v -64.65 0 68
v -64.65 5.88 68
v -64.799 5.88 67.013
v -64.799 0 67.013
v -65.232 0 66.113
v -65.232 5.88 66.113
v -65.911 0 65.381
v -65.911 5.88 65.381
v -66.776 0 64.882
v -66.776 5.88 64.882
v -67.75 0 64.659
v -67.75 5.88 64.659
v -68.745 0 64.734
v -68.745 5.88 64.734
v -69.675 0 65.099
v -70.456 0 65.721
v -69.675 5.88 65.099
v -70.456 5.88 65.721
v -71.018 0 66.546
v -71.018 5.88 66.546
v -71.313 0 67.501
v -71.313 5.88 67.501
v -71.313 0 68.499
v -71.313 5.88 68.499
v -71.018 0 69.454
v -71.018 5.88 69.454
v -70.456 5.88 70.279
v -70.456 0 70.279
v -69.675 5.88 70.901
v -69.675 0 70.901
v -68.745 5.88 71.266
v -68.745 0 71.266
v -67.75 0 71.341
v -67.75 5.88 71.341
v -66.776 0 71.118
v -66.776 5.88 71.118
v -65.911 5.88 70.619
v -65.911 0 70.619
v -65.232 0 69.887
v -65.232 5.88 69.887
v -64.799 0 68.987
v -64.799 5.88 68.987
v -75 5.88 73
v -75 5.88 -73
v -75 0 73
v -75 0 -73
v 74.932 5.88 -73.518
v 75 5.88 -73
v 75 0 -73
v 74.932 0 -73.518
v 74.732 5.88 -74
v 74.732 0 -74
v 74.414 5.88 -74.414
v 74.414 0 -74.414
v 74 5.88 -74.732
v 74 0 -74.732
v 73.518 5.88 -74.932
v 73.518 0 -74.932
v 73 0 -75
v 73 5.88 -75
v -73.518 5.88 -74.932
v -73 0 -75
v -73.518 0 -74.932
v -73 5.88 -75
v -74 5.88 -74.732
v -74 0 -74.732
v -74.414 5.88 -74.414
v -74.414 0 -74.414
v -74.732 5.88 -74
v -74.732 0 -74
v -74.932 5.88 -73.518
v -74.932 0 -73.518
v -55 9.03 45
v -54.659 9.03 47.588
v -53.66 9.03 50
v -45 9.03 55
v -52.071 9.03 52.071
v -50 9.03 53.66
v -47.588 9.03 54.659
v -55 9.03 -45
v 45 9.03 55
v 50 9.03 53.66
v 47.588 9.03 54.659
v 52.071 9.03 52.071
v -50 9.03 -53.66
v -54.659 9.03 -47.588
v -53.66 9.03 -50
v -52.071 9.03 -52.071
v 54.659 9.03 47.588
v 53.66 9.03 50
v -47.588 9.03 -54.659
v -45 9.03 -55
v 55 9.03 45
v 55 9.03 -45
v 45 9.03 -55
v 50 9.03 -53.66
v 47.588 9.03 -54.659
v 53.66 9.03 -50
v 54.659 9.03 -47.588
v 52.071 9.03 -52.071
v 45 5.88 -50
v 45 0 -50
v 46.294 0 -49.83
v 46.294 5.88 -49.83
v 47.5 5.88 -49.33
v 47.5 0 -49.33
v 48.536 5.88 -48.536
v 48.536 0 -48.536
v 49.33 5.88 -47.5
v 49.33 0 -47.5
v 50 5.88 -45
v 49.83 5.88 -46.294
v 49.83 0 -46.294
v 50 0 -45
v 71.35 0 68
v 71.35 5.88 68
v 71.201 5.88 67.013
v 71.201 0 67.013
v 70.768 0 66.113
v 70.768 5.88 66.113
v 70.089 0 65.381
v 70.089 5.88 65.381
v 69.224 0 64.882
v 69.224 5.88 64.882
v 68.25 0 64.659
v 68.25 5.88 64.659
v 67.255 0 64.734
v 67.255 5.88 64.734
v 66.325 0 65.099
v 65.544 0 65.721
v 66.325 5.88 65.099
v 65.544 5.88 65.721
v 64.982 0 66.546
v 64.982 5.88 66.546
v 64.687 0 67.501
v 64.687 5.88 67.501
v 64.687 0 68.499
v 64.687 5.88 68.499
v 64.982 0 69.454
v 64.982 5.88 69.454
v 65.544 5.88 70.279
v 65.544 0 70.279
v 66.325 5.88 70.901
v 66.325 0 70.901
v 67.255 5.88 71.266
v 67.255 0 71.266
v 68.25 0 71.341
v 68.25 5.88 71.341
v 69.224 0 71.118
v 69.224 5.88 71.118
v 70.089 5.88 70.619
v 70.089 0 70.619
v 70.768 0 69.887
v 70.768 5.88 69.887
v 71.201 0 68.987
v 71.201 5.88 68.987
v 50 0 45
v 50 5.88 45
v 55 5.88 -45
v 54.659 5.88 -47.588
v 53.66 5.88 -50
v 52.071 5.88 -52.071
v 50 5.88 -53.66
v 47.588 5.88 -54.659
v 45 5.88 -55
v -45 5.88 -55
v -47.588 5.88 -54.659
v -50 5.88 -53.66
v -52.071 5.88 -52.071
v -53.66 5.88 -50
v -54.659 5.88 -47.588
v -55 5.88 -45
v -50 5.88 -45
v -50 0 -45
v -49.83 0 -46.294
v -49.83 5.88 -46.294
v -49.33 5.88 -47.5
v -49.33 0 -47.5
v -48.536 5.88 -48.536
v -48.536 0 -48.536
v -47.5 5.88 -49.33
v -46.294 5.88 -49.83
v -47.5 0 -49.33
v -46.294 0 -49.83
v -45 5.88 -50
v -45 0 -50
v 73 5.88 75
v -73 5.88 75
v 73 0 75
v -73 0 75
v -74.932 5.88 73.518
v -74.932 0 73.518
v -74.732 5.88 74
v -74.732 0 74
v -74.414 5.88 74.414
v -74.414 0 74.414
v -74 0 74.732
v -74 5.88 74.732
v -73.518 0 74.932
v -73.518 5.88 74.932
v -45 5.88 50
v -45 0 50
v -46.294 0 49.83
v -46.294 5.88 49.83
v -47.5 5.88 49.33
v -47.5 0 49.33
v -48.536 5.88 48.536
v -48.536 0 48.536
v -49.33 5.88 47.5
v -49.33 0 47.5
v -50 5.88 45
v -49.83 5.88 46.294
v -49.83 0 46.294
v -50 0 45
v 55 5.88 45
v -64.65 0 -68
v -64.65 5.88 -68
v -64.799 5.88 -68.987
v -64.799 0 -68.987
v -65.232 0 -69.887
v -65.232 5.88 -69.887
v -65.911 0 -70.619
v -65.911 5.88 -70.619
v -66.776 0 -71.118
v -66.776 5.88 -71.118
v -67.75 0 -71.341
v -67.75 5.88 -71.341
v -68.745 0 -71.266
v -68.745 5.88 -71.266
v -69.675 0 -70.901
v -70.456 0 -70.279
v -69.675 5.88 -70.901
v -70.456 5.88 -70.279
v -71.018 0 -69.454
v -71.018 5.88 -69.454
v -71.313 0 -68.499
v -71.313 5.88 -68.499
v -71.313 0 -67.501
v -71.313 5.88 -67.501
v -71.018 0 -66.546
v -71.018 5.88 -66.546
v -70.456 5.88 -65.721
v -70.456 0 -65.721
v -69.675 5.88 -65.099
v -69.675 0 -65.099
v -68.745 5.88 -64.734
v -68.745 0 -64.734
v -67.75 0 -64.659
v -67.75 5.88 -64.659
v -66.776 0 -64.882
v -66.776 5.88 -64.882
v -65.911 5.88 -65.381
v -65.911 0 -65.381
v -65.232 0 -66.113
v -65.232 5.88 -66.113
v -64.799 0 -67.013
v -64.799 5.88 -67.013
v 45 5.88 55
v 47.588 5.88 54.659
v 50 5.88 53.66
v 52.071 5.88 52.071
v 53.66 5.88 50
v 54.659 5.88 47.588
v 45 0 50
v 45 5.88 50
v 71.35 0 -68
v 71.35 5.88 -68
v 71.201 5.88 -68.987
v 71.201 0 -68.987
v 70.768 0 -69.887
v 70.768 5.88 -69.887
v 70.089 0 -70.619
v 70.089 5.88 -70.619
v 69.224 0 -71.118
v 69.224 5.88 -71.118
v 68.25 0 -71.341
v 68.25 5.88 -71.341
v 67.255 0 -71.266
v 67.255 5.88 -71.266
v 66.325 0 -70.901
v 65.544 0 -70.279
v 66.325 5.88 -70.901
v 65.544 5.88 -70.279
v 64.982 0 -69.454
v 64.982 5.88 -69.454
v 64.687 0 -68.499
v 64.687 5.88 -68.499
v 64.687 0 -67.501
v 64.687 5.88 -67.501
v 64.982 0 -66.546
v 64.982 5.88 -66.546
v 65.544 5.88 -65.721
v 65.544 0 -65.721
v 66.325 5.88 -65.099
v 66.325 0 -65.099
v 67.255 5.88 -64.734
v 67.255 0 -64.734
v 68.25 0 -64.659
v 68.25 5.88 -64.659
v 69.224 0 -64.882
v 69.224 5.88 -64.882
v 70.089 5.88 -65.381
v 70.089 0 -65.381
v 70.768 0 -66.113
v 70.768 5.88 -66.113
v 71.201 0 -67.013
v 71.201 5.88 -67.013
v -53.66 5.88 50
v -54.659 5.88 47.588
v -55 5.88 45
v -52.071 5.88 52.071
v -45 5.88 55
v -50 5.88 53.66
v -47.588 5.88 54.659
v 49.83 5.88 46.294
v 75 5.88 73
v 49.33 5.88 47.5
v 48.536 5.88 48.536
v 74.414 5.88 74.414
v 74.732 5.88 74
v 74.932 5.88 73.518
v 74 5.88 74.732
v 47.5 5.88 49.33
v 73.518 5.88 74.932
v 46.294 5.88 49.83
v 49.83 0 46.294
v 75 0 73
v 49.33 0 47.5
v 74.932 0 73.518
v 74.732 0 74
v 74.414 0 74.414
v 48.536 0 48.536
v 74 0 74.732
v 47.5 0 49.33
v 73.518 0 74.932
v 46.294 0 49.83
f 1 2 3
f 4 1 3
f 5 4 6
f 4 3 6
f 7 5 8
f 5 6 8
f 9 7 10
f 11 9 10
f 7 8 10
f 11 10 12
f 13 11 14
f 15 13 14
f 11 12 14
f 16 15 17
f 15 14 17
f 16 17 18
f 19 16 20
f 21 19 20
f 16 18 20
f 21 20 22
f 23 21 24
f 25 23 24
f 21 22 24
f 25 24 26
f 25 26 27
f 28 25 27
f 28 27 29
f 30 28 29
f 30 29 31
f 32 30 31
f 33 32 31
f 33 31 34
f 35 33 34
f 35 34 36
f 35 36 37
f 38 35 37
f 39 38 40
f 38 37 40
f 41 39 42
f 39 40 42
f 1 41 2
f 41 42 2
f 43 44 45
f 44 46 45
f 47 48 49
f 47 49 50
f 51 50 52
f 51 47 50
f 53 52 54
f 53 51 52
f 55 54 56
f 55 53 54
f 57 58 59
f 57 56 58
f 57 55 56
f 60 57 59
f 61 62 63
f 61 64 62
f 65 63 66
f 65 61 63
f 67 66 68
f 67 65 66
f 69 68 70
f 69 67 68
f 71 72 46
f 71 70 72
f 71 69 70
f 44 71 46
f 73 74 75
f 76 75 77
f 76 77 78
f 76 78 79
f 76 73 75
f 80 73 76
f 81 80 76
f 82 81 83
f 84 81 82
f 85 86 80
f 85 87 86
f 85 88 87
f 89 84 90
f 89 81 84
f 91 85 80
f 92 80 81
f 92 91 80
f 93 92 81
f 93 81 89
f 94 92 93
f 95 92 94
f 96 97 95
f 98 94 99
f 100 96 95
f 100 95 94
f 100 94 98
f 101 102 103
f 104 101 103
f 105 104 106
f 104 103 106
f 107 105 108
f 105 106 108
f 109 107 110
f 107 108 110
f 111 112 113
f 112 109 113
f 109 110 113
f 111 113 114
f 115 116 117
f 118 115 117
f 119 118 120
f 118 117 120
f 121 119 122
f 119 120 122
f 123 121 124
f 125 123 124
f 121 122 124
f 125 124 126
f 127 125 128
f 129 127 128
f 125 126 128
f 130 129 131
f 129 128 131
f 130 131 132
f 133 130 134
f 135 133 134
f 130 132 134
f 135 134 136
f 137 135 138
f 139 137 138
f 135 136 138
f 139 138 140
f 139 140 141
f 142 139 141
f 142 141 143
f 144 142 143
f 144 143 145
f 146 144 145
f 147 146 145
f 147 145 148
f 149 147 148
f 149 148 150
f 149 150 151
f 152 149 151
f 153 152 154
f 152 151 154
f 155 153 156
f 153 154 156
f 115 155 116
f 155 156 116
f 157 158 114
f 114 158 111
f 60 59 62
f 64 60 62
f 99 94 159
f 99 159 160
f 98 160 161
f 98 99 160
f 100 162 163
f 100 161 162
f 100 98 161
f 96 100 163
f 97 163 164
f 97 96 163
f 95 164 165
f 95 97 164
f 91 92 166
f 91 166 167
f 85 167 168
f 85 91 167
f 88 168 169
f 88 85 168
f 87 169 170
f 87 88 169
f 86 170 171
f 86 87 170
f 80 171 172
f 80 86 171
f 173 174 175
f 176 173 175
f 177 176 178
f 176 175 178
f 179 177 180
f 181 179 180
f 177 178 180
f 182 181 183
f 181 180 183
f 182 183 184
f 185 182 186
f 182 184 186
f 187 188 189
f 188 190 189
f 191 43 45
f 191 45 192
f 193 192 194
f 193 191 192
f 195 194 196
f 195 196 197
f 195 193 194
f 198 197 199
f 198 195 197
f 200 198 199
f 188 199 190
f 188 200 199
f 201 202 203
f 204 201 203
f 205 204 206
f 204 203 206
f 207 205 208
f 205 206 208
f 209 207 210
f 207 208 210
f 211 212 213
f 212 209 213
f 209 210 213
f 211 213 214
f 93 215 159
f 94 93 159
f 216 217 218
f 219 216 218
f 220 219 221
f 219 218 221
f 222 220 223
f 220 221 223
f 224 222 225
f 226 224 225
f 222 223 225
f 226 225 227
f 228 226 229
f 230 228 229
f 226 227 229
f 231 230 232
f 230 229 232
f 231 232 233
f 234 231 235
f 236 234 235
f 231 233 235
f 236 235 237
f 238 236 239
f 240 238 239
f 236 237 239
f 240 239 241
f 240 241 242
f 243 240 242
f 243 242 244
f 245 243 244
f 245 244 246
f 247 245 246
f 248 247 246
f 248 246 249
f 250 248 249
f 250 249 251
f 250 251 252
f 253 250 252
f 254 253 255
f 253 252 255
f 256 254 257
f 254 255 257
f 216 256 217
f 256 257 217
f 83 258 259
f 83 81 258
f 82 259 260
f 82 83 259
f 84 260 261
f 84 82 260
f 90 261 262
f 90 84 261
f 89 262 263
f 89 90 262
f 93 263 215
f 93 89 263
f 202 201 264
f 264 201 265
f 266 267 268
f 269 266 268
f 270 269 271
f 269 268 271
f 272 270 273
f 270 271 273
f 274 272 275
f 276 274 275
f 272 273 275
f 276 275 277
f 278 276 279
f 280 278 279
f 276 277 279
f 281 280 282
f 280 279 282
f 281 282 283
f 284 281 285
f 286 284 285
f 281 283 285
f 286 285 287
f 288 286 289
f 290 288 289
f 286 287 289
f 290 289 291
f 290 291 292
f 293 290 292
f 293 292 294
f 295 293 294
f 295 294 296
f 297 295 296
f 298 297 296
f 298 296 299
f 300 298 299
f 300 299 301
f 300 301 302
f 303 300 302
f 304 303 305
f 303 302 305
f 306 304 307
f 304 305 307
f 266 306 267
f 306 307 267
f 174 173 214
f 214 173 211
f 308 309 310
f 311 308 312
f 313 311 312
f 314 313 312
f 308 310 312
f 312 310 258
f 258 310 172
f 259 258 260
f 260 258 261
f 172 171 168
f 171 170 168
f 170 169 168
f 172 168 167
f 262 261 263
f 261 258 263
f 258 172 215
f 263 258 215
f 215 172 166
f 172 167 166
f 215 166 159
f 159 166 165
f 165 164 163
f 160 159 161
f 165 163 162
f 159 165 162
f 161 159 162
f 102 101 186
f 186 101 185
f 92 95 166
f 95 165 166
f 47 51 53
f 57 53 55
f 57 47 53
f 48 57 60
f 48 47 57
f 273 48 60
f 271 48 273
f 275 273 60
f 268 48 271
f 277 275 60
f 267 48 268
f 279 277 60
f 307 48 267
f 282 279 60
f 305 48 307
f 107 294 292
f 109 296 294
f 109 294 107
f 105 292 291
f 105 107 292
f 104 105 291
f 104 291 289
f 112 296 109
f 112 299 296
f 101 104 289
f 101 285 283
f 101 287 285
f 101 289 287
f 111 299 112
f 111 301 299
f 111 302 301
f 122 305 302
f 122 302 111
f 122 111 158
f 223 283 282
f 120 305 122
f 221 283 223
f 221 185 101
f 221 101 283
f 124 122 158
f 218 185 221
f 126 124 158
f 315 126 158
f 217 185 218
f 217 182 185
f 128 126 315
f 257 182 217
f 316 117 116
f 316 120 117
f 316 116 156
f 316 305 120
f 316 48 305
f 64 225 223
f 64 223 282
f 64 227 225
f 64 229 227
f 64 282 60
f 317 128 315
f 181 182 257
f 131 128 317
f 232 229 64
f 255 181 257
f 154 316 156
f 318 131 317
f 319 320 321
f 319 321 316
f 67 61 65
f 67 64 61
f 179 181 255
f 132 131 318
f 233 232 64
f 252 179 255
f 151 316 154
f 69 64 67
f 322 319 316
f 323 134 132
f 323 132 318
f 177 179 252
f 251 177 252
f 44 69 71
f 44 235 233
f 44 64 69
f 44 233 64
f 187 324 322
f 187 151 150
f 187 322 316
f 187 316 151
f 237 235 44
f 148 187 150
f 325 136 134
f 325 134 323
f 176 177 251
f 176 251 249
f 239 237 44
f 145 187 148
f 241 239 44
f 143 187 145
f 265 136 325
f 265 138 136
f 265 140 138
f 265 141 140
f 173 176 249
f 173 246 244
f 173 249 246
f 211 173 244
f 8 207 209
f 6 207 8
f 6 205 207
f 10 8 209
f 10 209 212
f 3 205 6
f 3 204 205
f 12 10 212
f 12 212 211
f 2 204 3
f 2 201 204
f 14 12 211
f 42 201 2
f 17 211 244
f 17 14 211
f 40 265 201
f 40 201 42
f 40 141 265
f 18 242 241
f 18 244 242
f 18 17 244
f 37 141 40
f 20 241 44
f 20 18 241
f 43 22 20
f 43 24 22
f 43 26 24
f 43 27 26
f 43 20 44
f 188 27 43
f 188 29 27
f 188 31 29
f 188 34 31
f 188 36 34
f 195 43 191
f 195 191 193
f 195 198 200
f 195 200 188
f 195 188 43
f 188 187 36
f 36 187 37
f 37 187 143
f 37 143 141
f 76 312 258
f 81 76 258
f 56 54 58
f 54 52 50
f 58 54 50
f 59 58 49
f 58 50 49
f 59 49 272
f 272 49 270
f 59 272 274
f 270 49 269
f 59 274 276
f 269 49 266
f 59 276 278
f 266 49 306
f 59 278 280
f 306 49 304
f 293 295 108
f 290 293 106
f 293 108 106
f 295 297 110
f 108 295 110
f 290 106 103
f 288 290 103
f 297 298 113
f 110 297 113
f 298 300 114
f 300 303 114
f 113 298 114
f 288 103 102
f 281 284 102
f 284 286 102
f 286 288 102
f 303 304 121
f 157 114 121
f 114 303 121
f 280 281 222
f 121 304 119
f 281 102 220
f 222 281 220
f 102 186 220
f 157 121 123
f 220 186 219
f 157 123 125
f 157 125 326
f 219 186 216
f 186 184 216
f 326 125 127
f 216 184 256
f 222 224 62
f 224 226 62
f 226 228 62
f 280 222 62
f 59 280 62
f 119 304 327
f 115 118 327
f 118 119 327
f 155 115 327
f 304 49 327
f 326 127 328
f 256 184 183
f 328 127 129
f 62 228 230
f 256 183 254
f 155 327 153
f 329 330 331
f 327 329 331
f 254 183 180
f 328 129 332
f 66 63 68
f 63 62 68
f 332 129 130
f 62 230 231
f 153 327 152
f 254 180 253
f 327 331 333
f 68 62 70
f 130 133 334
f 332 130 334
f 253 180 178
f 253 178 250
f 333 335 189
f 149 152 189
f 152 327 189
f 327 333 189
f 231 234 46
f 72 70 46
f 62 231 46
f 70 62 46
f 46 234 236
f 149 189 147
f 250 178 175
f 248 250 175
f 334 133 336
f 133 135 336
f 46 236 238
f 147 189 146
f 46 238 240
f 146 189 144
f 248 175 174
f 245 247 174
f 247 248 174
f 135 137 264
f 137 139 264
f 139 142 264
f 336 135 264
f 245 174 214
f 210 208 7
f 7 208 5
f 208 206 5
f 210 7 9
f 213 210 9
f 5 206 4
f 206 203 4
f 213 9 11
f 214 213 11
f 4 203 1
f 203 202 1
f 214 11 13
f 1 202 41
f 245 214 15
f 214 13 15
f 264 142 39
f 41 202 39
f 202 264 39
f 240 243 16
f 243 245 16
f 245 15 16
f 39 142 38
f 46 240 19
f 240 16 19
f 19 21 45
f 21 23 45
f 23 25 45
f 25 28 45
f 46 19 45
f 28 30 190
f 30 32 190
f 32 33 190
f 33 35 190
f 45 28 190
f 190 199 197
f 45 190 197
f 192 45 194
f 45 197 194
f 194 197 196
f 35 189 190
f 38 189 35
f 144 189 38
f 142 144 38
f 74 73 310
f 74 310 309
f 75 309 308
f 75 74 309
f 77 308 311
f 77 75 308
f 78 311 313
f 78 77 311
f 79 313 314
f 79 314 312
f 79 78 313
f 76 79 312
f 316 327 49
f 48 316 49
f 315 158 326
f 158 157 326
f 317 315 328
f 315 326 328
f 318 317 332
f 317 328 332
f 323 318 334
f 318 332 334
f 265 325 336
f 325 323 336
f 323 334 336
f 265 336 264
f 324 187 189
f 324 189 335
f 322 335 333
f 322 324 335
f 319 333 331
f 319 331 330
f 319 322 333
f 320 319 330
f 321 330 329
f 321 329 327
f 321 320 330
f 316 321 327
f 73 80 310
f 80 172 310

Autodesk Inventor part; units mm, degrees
ref_plane "YZ Plane" through (0, 0, 0) normal (1, 0, 0) x (0, 1, 0)
ref_plane "XZ Plane" through (0, 0, 0) normal (0, 1, 0) x (-1, 0, 0)
ref_plane "XY Plane" through (0, 0, 0) normal (0, 0, 1) x (1, 0, 0)
sketch "Sketch1" plane through (0, 0, 0) normal (0, 1, 0) x (-1, 0, 0)
  line L0 (75, 75) -> (-75, 75)
  line L1 (-75, 75) -> (-75, -75)
  line L2 (-75, -75) -> (75, -75)
  line L3 (75, -75) -> (75, 75)
  line L4 (75, 75) -> (-75, -75) construction
  line L5 (-75, 75) -> (75, -75) construction
  point P0 (0, 0)
  dimension "d0" = 150
  dimension "d1" = 150
extrude "Extrusion1" add sketch "Sketch1" along normal blind 5.88
sketch "Sketch2" plane through (0, 5.88, 0) normal (0, 1, 0) x (1, 0, 0)
  line L0 (-75.5, -90.5) -> (75.5, -90.5)
  line L1 (75.5, -90.5) -> (75.5, 90.5)
  line L2 (75.5, 90.5) -> (-75.5, 90.5)
  line L3 (-75.5, 90.5) -> (-75.5, -90.5)
  line L4 (-75.5, -90.5) -> (75.5, 90.5) construction
  line L5 (75.5, -90.5) -> (-75.5, 90.5) construction
  circle A0 centre (-68, 68) radius 3.35
  circle A1 centre (-68, -68) radius 3.35
  circle A2 centre (68, -68) radius 3.35
  circle A3 centre (68, 68) radius 3.35
  line L6 (-50, -50) -> (50, -50)
  line L7 (50, -50) -> (50, 50)
  line L8 (50, 50) -> (-50, 50)
  line L9 (-50, 50) -> (-50, -50)
  line L10 (-50, -50) -> (50, 50) construction
  line L11 (50, -50) -> (-50, 50) construction
  point P0 (0, 0)
  dimension "d4" = 151
  dimension "d5" = 181
  dimension "d6" = 6.7
  dimension "d7" = 7.5
  dimension "d8" = 22.5
  dimension "d11" = 360
  dimension "d13" = 100
  dimension "d14" = 100
extrude "Extrusion2" cut sketch "Sketch2" against normal blind 5.88 contours A0 | A1 | A2 | A3 | L9 L8 L7 L6
sketch "Sketch4" plane through (0, 5.88, 0) normal (0, 1, 0) x (1, 0, 0)
  line L0 (-55, -55) -> (55, -55)
  line L1 (55, -55) -> (55, 55)
  line L2 (55, 55) -> (-55, 55)
  line L3 (-55, 55) -> (-55, -55)
  line L4 (-55, -55) -> (55, 55) construction
  line L5 (55, -55) -> (-55, 55) construction
  point P0 (0, 0)
  dimension "d21" = 110
  dimension "d22" = 110
extrude "Extrusion4" add sketch "Sketch4" along normal blind 3.15 separate body
fillet "Fillet1" radius 10 4 edges at (-55, 7.455, 55) (55, 7.455, 55) (55, 7.455, -55) (-55, 7.455, -55)
fillet "Fillet2" radius 5 4 edges at (-50, 2.94, 50) (50, 2.94, 50) (-50, 2.94, -50) (50, 2.94, -50)
fillet "Fillet3" radius 2 4 edges at (-75, 2.94, 75) (75, 2.94, 75) (75, 2.94, -75) (-75, 2.94, -75)
equation "\"d0\" = inner_bottom_x"
equation "\"d1\" = inner_bottom_y"
equation "\"d2\" = t_inner_tray"
equation "\"d4\" = tray_x"
equation "\"d5\" = tray_y"
equation "\"d6\" = m5_brass_insert_drill"
equation "\"d7\" = 0.5 * tray_border"
equation "\"d8\" = 1.5 * tray_border"
equation "\"d13\" = bottom_clear_x - 2 * bottom_clear_border"
equation "\"d14\" = bottom_clear_y - 2 * bottom_clear_border"
equation "\"d15\" = t_inner_tray"
equation "\"d21\" = bottom_clear_x"
equation "\"d22\" = bottom_clear_y"
equation "\"d23\" = t_bottom_clear"
equation "\"d25\" = 2 * bottom_clear_border"
equation "\"d26\" = bottom_clear_border"
equation "\"d27\" = small_round"
equation "\"thick_acrylic\" = 5.88"
equation "\"thin_acrylic\" = 3.15"
equation "\"clear_acrylic\" = 3.15"
equation "\"wood_thickness\" = 6.72"
equation "\"al1_thickness\" = 1.5875"
equation "\"m3_diameter\" = 3.15"
equation "\"m4_diameter\" = 4.2"
equation "\"m5_diameter\" = 5.25"
equation "\"brass_insert_drill\" = 4"
equation "\"m5_brass_insert_drill\" = 6.7"
equation "\"m5_press_nut_drill\" = 6.35"
equation "\"m3_main_length\" = 14"
equation "\"m3_main_nut_width\" = 5.7"
equation "\"m3_main_nut_thickness\" = 2.5"
equation "\"m3_main_extra\" = 1"
equation "\"stepper_screw_space\" = 35"
equation "\"stepper_shaft_diameter\" = 5"
equation "\"stepper_body_diameter\" = 28"
equation "\"laser_body_diameter\" = 12"
equation "\"t_carrier\" = 6.72"
equation "\"t_wall\" = 5.88"
equation "\"t_window\" = 3.15"
equation "\"carrier_y\" = 181"
equation "\"carrier_z\" = 233.04"
equation "\"carrier_z2\" = 283.04"
equation "\"protection_slot\" = 30.2"
equation "\"protection_slot_offset\" = 37.75"
equation "\"protection_slot_length\" = 20.6"
equation "\"window_z\" = 185"
equation "\"window_y\" = 49.56"
equation "\"window_slot\" = 25"
equation "\"door_sensor\" = 35"
equation "\"reservoir_x\" = 151"
equation "\"reservoir_y\" = 151"
equation "\"linear_bearing_spacing\" = 207"
equation "\"linear_bearing_z\" = 304.8"
equation "\"threaded_rod_z\" = 203.2"
equation "\"motor_spacing\" = 287"
equation "\"t_tray\" = 3.15"
equation "\"tray_border\" = 15"
equation "\"tray_x\" = 151"
equation "\"tray_y\" = 181"
equation "\"bed_t\" = 1.5875"
equation "\"bed_y2\" = 45.96"
equation "\"bed_fold_x\" = 15"
equation "\"bed_gap\" = 0.3"
equation "\"t_inner_tray\" = 5.88"
equation "\"t_tape\" = 3"
equation "\"inner_tray_x\" = 145"
equation "\"inner_tray_y\" = 145"
equation "\"inner_tray_border\" = 5"
equation "\"inner_tray_radius\" = 24"
equation "\"inner_bottom_x\" = 150"
equation "\"inner_bottom_y\" = 150"
equation "\"brass_keep_out\" = 8"
equation "\"tape_keep_out\" = 2"
equation "\"tape_thickness\" = 2"
equation "\"t_crane\" = 6.72"
equation "\"crane_x\" = 244.56"
equation "\"end_stop_offset_x\" = 83"
equation "\"end_stop_spacing\" = 19"
equation "\"thumb_nut_offset_y\" = 11.72"
equation "\"thumb_nut_diameter\" = 7"
equation "\"z_min_from_center\" = 72.28"
equation "\"t_frame\" = 6.72"
equation "\"frame_top_z\" = 295"
equation "\"frame_bottom_z\" = 225"
equation "\"frame_y\" = 68.44"
equation "\"frame_border\" = 39.5"
equation "\"frame_foot_z\" = 49.5"
equation "\"frame_foot_extension\" = 6"
equation "\"frame_tilt\" = 0"
equation "\"printer_z\" = 289"
equation "\"lcd_x\" = 72"
equation "\"lcd_y\" = 25"
equation "\"subframe_y_offset\" = 27.5"
equation "\"laser_y_offset\" = 19.4"
equation "\"laser_diameter\" = 12"
equation "\"laser_y\" = 33"
equation "\"laser_z\" = 33"
equation "\"laser_x\" = 62"
equation "\"t_galvo_frame\" = 6.72"
equation "\"galvo_frame_x\" = 66"
equation "\"galvo_frame_z\" = 65"
equation "\"galvo_frame_y_offset\" = 27.5"
equation "\"drawer_x\" = 181"
equation "\"drawer_y\" = 49.56"
equation "\"drawer_z\" = 206.72"
equation "\"drawer_z_from_bottom\" = 25"
equation "\"drawer_foot_mount\" = 18"
equation "\"asym_key\" = 0"
equation "\"small_round\" = 2"
equation "\"bottom_clear_x\" = 110"
equation "\"bottom_clear_y\" = 110"
equation "\"t_bottom_clear\" = 3.15"
equation "\"bottom_clear_border\" = 5"
equation "\"laser_screw_spacing_y\" = 16"
properties part number "inner_tray_bottom"
